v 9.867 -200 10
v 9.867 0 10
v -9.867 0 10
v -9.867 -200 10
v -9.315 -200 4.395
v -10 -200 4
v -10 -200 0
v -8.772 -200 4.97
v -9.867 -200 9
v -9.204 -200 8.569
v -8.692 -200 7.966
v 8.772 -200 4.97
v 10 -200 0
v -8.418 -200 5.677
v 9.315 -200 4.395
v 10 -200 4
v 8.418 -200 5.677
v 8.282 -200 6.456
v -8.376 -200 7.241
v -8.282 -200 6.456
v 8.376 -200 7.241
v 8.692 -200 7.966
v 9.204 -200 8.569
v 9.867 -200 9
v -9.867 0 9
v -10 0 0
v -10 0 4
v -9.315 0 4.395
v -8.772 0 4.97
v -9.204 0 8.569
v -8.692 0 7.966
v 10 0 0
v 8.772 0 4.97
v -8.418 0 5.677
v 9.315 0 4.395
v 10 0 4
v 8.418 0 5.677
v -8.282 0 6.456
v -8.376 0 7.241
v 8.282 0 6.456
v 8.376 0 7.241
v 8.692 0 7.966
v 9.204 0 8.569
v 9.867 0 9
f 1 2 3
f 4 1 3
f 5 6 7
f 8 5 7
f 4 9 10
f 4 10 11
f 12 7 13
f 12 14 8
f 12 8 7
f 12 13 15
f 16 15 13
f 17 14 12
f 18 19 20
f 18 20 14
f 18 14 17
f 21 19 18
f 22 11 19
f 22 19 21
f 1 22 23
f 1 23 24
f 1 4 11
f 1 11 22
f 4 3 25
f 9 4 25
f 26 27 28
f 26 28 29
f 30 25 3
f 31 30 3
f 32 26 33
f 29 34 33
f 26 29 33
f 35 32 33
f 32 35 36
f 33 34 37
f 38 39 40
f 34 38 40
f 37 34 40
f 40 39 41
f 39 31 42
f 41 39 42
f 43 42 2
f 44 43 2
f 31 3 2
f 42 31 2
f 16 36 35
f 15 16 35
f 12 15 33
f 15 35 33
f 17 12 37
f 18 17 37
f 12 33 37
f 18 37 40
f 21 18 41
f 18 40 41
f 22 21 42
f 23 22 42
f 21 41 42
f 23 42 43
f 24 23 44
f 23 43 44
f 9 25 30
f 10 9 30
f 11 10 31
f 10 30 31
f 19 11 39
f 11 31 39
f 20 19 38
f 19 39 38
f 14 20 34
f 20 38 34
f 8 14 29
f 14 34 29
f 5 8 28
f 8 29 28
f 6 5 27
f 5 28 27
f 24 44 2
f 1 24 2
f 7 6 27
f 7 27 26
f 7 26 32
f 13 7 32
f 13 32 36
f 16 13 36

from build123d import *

# Parameters (mm, degrees)
F2_DEPTH = 200


with BuildPart() as f2:
    # F0 (on Front) → F2 (new body)
    with BuildSketch(Plane.XZ):
        with BuildLine():
            Line((-10, 0), (0, 0))
            Line((0, 0), (10, 0))
            Line((10, 0), (10, 4))
            ThreePointArc((10, 4), (8.2820023216, 6.4560436706), (9.8669164293, 9))
            Line((9.8669164293, 9), (9.8669164293, 10))
            Line((9.8669164293, 10), (0, 10))
            Line((0, 10), (-9.8669164293, 10))
            Line((-9.8669164293, 10), (-9.8669164293, 9))
            ThreePointArc((-9.8669164293, 9), (-8.2820023216, 6.4560436706), (-10, 4))
            Line((-10, 4), (-10, 0))
        make_face()
    extrude(amount=F2_DEPTH)


solid = f2.part
